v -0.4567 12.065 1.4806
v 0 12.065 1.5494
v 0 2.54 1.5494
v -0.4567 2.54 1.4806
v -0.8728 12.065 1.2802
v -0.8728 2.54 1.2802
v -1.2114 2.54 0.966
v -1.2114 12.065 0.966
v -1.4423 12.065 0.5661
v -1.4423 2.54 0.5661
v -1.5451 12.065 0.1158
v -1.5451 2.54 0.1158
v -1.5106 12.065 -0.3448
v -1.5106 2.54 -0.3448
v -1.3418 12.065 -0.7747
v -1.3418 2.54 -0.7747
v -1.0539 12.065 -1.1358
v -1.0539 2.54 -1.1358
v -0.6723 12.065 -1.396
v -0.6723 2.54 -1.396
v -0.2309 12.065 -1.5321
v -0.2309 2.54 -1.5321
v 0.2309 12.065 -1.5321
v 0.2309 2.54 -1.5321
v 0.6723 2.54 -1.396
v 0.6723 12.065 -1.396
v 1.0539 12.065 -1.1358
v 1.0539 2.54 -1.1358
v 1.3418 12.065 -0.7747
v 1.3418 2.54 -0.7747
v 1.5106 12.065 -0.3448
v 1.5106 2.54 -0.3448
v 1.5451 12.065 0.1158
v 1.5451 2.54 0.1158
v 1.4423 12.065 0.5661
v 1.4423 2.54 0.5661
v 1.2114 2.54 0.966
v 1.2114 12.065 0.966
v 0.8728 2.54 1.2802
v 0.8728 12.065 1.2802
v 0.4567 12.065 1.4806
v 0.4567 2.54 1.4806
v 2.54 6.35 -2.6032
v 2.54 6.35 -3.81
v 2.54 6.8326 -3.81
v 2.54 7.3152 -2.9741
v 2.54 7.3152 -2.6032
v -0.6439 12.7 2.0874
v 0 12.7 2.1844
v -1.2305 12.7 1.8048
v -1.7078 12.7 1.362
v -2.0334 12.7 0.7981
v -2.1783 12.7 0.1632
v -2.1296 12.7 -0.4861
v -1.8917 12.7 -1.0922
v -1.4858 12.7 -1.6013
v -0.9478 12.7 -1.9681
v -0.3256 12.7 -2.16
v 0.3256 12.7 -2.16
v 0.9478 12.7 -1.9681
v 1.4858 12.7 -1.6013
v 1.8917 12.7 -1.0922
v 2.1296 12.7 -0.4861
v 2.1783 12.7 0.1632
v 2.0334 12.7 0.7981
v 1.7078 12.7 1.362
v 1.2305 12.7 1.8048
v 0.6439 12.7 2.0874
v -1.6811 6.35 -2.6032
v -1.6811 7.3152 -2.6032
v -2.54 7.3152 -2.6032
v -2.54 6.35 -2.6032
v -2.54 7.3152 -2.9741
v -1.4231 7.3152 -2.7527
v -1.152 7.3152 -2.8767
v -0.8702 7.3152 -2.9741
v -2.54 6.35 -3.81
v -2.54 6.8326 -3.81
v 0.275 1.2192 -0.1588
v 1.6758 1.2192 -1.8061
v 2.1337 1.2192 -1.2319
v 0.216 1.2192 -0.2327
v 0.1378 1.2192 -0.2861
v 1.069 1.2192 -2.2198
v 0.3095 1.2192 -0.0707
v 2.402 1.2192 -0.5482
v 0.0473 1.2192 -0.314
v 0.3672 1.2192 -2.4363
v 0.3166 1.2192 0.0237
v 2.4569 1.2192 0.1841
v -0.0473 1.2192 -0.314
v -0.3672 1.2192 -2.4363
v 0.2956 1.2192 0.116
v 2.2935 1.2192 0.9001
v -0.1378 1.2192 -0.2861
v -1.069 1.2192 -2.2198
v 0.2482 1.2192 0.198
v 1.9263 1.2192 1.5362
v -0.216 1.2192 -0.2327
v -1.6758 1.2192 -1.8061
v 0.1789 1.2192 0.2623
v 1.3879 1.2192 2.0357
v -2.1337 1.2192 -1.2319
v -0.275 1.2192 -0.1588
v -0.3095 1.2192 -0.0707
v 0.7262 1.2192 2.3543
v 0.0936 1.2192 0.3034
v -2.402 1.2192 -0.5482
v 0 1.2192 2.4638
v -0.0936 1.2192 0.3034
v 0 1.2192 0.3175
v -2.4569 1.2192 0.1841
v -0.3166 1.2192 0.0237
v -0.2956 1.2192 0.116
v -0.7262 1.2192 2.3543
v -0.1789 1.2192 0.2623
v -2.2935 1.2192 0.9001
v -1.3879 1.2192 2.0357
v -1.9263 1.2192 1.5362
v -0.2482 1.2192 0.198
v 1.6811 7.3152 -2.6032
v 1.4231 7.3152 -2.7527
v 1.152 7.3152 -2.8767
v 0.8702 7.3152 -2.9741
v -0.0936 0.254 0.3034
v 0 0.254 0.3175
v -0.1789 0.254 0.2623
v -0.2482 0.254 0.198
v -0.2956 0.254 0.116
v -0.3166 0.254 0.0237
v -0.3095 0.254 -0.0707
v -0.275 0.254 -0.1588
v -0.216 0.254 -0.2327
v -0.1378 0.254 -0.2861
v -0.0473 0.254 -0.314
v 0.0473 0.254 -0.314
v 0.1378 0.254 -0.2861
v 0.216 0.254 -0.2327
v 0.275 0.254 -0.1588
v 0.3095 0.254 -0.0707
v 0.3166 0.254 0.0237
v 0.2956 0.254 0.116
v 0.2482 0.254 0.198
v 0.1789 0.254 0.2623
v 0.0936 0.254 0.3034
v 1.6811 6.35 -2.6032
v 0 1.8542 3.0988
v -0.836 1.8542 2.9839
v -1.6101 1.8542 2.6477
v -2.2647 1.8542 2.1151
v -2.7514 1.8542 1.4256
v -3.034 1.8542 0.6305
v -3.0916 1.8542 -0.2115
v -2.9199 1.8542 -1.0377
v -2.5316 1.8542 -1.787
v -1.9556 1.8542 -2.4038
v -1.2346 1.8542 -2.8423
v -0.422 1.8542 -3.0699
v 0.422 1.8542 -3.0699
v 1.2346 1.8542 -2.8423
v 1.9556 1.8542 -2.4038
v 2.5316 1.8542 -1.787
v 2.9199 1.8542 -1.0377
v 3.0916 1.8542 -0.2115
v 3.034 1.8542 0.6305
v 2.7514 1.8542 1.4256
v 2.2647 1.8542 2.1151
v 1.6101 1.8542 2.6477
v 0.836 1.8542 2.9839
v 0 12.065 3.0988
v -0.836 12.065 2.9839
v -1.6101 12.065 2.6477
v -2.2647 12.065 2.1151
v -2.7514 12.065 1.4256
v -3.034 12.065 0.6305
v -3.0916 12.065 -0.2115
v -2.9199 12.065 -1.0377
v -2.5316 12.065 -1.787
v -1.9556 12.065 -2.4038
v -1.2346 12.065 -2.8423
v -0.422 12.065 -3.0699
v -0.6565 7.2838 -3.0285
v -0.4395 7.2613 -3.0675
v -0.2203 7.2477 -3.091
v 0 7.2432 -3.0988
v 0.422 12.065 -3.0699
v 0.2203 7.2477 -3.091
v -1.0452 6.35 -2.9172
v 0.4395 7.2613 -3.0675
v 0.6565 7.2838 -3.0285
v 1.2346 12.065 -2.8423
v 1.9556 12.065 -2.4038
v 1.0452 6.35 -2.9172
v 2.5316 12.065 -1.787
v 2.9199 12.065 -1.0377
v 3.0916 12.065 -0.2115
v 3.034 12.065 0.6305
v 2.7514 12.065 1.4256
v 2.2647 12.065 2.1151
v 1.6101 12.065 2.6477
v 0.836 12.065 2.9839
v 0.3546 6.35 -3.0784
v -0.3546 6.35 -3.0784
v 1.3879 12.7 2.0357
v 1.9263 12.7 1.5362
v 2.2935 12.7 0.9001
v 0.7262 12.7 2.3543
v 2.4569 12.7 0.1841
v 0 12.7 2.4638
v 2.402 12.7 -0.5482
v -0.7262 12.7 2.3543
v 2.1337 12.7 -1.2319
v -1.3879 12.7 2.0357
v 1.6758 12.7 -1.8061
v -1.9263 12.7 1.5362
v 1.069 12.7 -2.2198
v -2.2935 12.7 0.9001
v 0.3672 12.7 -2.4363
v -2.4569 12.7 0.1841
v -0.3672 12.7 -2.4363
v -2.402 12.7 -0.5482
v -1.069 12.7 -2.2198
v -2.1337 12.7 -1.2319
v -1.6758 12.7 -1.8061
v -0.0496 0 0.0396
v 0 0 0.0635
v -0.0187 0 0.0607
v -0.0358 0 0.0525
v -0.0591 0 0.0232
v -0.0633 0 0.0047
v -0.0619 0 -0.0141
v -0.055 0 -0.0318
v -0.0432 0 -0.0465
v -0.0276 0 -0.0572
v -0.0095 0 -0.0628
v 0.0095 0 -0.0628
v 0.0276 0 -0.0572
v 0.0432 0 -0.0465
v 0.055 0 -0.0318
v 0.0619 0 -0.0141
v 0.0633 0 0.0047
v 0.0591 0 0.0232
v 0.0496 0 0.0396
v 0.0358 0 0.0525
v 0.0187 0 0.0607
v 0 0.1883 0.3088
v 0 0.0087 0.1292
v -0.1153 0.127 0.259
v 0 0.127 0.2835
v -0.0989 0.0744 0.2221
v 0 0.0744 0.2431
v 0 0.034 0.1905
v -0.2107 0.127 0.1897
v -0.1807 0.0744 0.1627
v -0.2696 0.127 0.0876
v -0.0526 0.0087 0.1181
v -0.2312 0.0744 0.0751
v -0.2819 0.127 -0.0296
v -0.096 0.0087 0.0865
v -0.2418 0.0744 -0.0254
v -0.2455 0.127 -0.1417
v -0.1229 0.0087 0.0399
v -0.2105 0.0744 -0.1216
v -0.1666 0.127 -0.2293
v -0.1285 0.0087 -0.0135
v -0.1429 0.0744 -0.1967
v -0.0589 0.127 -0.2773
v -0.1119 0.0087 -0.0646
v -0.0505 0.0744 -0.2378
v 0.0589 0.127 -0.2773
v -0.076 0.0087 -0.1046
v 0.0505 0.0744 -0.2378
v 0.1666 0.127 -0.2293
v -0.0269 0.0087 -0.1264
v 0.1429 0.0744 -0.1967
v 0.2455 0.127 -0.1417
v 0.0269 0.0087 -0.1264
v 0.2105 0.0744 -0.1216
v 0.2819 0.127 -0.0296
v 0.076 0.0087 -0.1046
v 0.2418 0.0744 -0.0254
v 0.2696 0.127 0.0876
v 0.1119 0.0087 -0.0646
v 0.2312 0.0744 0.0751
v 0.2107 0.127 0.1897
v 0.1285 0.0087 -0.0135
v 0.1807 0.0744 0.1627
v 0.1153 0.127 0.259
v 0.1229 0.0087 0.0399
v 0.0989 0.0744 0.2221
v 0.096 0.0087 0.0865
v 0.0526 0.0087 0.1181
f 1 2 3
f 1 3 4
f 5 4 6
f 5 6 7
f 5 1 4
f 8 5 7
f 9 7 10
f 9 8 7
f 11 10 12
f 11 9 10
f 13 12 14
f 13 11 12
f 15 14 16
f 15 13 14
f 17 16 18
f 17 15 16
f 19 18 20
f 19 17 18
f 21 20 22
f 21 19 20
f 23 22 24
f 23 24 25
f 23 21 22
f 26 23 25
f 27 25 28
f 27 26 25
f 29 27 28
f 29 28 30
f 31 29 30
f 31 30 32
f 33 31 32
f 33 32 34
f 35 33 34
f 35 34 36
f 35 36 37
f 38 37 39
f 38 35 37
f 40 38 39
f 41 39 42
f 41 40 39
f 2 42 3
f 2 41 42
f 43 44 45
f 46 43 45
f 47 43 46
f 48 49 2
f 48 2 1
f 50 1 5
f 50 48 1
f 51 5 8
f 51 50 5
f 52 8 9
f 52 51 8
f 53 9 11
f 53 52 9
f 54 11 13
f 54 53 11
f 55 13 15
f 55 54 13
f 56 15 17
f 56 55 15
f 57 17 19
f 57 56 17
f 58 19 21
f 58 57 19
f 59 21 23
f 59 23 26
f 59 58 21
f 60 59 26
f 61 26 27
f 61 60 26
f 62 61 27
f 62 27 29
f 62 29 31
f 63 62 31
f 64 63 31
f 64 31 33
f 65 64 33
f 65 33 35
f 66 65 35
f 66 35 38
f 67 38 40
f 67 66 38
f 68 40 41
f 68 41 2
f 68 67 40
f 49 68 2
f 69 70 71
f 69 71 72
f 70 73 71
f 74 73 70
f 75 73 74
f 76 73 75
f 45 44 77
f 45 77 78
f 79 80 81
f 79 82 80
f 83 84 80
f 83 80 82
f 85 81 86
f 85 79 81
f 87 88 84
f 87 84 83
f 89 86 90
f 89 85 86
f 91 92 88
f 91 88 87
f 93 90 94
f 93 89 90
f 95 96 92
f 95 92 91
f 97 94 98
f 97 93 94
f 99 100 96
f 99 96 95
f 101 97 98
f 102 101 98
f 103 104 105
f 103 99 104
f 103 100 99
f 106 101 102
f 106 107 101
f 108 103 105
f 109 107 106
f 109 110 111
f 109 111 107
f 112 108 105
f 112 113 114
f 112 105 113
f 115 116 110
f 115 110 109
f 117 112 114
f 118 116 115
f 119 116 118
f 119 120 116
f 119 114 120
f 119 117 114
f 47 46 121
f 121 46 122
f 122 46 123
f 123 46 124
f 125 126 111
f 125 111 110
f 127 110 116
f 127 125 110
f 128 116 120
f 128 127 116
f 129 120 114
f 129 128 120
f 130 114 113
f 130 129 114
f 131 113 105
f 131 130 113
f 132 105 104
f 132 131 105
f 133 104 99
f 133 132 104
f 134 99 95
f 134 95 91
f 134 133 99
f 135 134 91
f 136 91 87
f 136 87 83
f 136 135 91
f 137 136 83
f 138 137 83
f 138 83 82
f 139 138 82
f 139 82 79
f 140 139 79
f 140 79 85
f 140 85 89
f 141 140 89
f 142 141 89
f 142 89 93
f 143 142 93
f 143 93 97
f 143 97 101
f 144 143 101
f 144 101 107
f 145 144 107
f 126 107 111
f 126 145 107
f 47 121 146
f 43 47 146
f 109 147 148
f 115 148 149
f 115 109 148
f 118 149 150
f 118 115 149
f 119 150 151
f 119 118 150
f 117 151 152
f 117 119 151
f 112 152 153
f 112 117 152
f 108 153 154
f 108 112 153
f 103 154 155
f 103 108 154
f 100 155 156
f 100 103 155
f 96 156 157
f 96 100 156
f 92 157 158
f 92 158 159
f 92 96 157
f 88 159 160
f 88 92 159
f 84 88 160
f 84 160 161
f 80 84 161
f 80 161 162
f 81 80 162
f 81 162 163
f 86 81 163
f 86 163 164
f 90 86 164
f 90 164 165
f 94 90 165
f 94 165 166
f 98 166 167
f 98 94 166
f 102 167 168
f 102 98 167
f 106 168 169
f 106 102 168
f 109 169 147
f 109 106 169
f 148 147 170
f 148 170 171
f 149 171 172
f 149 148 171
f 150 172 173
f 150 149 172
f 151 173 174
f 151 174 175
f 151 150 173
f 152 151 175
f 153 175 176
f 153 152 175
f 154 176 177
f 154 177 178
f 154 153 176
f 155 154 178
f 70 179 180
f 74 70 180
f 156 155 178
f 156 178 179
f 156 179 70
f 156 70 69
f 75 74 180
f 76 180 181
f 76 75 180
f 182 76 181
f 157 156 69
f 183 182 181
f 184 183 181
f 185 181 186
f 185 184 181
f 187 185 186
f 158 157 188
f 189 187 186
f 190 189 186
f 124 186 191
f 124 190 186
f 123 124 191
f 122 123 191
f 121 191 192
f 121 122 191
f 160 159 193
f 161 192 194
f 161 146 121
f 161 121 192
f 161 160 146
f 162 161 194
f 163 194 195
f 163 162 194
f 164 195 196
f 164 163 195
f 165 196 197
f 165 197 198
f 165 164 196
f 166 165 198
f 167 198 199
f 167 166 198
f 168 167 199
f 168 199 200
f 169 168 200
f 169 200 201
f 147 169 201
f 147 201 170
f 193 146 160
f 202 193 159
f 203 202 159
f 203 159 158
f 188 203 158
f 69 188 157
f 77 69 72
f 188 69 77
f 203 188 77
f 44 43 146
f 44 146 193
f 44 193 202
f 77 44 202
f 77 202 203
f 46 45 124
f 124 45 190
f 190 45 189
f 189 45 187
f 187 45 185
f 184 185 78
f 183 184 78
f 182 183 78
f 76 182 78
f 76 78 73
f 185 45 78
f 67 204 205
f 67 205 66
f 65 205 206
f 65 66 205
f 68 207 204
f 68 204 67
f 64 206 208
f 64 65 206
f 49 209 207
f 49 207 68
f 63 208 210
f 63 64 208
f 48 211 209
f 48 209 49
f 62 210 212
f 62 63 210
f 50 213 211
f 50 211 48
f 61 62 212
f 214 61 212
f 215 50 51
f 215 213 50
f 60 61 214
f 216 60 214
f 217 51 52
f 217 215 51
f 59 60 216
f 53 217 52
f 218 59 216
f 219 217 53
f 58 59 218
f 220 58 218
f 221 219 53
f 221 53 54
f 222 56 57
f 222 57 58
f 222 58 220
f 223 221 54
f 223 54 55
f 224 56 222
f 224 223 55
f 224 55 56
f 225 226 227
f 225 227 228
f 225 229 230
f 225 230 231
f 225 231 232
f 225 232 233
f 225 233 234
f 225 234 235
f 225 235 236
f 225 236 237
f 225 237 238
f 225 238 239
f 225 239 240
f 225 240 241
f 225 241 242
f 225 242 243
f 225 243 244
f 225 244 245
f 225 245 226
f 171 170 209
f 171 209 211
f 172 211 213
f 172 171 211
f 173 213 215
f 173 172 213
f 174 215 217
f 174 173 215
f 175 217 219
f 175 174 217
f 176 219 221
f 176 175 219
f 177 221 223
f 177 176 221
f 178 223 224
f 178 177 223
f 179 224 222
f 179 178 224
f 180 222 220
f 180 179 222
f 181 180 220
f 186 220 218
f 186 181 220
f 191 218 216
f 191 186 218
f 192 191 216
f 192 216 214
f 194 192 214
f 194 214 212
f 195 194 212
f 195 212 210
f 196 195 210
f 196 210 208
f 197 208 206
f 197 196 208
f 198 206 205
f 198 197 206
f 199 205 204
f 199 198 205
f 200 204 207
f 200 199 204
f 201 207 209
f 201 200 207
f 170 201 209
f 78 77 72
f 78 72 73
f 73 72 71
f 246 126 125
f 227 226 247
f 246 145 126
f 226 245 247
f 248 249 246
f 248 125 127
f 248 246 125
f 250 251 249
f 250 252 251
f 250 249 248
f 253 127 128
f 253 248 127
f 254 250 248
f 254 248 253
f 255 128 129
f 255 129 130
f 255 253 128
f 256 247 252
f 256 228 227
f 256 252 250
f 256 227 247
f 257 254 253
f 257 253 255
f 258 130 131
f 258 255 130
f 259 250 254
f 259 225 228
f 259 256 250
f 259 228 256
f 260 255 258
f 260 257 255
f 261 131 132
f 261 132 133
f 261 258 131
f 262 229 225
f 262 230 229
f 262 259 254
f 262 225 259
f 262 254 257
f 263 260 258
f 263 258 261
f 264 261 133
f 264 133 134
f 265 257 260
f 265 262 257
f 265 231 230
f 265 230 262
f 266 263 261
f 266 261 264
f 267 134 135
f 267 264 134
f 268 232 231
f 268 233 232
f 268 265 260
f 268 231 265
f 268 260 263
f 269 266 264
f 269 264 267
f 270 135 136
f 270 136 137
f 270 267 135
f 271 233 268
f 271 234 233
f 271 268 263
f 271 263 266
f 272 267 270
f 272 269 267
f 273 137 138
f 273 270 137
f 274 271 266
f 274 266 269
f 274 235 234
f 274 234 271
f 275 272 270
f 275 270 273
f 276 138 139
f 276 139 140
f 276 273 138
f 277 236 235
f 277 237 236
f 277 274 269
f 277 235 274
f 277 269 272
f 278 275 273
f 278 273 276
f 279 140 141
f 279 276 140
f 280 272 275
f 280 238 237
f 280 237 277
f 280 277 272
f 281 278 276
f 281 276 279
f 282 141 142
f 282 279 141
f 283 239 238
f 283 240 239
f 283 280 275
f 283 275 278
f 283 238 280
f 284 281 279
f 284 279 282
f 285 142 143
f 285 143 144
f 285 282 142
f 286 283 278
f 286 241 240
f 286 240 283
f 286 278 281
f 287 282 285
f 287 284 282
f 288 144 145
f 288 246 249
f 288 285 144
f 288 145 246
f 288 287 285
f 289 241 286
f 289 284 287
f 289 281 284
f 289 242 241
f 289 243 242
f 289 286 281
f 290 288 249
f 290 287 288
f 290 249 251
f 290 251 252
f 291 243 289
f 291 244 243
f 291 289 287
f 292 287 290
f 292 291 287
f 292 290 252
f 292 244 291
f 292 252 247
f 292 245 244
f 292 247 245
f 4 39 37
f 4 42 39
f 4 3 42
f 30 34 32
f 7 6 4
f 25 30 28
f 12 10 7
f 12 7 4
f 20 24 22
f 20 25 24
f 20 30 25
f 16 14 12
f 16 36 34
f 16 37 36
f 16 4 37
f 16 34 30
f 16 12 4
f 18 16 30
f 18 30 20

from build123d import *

# Parameters (mm, degrees)
F2_SIZE       = 0.635
F3_R          = 0.254
F5_DEPTH      = 2.54
F5_DEPTH_BACK = 2.54


with BuildPart() as f1:
    # F0 (on Right) → F1 (revolve)
    with BuildSketch(Plane.YZ):
        Polygon((0, 0.3175), (0, 0), (2.54, 0), (2.54, 1.5494), (12.7, 1.5494), (12.7, 3.0988), (1.2192, 3.0988), (1.2192, 0.3175), align=None)
    revolve(axis=Axis((0, 1.27, 0), (0, -1, 0)))

    # F2
    f2_edges = [f1.edges().sort_by_distance(p)[0] for p in [
        (0, 1.2192, -3.0988),
        (0, 12.7, -1.5494),
        (0, 12.7, -3.0988),
    ]]
    chamfer(f2_edges, length=F2_SIZE)

    # F3
    f3_edges = [f1.edges().sort_by_distance(p)[0] for p in [
        (0, 0, -0.3175),
    ]]
    fillet(f3_edges, radius=F3_R)

    # F4 (on Right) → F5 (join, two sides)
    with BuildSketch(Plane.YZ) as f5_sk:
        Polygon((6.35, -2.603163), (6.35, -3.81), (6.8326, -3.81), (7.3152, -2.974112), (7.3152, -2.603163), align=None)
    extrude(amount=F5_DEPTH)
    extrude(f5_sk.sketch, amount=-F5_DEPTH_BACK)


solid = f1.part
